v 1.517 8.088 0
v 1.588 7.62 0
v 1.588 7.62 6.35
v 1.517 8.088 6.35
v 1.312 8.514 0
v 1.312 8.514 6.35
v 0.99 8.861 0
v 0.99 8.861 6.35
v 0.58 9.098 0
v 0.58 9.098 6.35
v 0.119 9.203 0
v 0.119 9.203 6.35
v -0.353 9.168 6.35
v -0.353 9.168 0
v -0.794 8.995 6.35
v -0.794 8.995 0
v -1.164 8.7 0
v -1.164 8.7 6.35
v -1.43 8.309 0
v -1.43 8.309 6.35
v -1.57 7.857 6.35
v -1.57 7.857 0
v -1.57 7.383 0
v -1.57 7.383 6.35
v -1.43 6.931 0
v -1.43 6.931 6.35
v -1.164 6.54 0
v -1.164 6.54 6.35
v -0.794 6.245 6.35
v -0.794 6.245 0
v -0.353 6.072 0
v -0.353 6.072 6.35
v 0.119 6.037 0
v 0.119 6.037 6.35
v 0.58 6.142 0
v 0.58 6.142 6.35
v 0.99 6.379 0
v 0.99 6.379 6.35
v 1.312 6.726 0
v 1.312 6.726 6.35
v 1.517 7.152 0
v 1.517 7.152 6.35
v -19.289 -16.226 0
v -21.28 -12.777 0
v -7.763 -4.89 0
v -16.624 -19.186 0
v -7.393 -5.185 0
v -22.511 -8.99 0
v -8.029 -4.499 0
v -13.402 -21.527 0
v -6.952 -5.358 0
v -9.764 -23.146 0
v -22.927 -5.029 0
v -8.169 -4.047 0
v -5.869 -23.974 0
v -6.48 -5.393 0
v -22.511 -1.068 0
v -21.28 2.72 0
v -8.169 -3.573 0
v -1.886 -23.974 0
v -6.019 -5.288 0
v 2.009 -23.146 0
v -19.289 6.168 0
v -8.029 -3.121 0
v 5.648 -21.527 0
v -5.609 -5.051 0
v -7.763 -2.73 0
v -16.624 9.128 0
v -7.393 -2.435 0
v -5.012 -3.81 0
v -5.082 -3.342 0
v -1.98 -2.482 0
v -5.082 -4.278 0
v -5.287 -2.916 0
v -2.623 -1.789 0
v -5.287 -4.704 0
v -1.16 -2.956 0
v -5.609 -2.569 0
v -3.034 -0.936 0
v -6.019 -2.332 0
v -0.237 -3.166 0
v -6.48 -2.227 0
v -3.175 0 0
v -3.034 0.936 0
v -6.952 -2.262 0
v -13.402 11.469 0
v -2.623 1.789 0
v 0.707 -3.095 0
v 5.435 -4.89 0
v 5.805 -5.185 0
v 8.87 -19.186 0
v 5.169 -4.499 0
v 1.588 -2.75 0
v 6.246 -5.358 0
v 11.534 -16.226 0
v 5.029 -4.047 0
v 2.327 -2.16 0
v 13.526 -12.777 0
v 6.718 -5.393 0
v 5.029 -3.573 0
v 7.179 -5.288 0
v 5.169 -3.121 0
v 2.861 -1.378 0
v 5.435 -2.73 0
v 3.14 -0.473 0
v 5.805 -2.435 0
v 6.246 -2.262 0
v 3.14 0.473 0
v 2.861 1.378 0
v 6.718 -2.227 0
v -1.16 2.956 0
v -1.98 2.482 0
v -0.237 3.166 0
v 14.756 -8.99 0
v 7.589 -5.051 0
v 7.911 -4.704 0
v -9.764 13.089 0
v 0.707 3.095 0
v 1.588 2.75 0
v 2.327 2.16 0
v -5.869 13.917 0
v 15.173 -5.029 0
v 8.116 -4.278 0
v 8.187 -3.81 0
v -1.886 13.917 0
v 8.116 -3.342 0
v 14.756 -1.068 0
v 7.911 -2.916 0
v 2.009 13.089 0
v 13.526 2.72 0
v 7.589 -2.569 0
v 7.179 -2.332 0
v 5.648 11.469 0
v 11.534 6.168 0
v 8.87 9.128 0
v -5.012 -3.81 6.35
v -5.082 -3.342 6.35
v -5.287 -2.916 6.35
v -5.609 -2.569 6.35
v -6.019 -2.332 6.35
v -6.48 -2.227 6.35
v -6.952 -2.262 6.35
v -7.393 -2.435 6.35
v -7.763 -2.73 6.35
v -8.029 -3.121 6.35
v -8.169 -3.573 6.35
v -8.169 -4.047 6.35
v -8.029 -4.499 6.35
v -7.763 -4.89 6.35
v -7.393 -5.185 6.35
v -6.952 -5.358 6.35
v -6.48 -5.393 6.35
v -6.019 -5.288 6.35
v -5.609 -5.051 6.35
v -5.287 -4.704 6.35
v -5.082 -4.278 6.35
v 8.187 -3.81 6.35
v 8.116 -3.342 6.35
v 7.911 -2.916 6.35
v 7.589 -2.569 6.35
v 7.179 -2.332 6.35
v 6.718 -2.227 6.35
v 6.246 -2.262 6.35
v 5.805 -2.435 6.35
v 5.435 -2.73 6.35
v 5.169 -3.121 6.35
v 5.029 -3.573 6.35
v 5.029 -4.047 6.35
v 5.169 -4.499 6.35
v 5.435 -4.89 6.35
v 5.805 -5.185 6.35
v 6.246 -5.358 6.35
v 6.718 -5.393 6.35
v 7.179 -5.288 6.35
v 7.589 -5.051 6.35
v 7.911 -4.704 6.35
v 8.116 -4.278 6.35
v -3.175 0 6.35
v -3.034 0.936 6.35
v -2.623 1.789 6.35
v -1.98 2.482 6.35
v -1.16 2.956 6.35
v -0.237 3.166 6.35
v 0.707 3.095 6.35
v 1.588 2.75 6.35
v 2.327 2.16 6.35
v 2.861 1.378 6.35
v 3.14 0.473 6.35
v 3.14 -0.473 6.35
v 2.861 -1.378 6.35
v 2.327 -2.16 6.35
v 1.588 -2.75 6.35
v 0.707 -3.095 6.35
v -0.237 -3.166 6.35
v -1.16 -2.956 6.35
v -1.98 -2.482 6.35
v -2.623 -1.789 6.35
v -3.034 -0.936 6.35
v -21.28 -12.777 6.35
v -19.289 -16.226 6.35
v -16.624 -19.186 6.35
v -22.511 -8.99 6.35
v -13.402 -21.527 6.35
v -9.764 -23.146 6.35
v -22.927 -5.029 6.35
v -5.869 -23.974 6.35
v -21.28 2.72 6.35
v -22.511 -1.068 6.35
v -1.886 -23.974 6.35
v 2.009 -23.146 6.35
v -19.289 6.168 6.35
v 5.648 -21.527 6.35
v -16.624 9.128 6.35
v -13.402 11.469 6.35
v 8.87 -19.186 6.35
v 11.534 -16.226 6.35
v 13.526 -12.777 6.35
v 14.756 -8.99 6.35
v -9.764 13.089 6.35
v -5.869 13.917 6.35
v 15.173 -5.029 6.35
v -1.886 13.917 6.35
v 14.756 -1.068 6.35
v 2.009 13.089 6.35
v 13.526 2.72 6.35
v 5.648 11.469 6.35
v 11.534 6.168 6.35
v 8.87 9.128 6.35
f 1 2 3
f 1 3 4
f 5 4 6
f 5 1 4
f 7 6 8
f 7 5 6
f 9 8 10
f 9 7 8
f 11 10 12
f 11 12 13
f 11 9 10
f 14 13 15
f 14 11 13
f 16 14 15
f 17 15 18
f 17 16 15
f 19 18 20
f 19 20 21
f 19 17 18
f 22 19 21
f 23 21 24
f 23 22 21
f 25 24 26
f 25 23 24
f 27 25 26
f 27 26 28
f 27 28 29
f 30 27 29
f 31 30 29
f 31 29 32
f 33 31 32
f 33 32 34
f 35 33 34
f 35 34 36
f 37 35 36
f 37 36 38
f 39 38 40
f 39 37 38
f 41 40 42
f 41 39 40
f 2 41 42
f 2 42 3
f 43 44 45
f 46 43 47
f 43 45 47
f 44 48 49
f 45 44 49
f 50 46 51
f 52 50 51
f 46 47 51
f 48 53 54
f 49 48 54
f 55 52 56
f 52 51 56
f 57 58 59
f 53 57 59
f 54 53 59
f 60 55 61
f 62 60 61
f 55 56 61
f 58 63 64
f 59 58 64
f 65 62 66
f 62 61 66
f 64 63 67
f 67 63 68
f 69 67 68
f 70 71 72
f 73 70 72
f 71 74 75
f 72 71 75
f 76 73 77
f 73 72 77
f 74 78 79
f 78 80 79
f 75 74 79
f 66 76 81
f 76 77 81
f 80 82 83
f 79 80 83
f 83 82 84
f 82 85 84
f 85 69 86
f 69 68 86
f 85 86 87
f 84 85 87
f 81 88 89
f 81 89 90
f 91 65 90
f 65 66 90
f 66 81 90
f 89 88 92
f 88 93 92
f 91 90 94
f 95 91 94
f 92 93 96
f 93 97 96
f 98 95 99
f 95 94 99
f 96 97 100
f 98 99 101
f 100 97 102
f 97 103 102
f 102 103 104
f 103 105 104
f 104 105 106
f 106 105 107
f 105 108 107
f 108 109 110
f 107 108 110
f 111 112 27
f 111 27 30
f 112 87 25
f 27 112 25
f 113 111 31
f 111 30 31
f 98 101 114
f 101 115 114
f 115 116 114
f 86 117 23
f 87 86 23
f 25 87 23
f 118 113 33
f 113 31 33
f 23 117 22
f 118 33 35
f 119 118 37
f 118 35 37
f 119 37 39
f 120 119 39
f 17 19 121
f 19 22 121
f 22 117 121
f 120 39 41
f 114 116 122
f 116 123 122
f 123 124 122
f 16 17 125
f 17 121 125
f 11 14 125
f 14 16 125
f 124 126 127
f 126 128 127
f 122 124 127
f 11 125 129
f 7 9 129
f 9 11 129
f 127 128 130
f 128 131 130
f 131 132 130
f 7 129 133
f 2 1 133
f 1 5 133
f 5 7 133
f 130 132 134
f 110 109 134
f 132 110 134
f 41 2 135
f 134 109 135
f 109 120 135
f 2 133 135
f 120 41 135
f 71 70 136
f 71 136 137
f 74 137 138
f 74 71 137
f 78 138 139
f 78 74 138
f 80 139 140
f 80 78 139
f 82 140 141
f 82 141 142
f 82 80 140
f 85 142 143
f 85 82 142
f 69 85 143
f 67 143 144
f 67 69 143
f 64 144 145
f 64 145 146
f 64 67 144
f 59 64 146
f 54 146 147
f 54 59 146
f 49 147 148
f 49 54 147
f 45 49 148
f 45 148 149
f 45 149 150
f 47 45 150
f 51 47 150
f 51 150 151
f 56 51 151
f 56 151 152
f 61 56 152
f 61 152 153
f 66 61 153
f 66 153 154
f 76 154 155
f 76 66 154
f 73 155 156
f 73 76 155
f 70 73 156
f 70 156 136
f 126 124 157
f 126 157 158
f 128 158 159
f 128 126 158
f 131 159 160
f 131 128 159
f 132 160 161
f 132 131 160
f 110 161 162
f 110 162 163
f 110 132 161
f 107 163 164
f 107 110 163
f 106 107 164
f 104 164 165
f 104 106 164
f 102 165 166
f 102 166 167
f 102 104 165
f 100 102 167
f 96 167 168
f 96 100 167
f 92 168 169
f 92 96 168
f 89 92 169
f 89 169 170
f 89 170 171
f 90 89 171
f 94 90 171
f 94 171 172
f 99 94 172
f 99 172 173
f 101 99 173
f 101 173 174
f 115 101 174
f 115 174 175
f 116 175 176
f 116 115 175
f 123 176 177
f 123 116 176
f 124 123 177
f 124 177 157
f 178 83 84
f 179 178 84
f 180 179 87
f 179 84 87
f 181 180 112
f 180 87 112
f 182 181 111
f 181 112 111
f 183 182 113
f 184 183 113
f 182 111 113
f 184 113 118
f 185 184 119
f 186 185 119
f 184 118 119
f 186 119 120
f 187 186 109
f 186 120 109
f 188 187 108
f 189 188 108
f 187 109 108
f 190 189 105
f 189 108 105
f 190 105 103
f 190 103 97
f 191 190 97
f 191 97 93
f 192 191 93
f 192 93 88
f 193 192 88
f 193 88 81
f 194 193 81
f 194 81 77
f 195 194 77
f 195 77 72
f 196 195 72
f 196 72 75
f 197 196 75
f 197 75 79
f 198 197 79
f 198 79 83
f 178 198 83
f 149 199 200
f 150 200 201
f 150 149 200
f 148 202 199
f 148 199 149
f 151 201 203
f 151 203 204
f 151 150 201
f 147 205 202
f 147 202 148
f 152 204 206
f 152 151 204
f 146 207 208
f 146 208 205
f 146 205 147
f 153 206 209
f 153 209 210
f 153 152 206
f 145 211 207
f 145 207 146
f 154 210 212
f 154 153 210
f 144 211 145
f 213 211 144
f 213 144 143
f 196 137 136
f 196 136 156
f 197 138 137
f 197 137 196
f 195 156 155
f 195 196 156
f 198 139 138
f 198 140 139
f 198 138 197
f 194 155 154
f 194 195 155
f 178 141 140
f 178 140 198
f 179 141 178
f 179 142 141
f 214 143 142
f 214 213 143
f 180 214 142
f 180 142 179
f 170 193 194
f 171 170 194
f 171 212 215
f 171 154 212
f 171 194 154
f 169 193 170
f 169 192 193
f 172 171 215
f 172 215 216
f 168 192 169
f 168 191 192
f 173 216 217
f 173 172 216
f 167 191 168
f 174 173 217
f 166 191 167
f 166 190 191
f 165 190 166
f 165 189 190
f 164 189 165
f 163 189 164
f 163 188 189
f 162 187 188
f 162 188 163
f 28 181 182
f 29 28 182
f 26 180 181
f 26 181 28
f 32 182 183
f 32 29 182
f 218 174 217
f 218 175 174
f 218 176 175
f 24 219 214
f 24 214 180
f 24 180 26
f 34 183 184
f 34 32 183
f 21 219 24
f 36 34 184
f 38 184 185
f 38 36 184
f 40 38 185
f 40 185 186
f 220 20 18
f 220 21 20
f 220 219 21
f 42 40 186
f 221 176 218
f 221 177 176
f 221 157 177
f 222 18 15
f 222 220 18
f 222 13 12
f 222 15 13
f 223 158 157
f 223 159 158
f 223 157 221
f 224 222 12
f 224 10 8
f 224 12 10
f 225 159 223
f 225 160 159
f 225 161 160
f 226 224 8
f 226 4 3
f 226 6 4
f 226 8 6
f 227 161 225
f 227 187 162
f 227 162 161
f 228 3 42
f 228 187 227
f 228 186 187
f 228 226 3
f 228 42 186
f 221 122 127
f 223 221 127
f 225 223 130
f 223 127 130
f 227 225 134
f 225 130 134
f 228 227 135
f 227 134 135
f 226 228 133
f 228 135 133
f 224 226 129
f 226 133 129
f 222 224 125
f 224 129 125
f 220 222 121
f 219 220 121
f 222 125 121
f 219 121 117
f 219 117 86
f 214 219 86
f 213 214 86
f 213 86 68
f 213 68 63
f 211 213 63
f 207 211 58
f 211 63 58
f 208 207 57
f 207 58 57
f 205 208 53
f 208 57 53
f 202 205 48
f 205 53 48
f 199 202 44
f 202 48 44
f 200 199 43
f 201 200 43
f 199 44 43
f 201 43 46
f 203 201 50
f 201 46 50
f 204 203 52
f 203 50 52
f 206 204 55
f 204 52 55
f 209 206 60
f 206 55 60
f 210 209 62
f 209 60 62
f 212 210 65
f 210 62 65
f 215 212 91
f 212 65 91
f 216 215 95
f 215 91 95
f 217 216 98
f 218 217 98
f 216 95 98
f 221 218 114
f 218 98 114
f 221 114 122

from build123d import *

# Parameters (mm, degrees)
F0_R     = 19.05
F0_R_2   = 1.5875
F1_DEPTH = 6.35
F3_D     = 6.35


with BuildPart() as f1:
    # F0 (on Top) → F1 (new body)
    with BuildSketch(Plane.XY):
        with Locations((-3.877292, -5.028827)):
            Circle(F0_R)
        with Locations((-6.599113, -3.81)):
            Circle(F0_R_2, mode=Mode.SUBTRACT)
        with Locations((6.599114, -3.809999)):
            Circle(F0_R_2, mode=Mode.SUBTRACT)
        with Locations((0, 7.62)):
            Circle(F0_R_2, mode=Mode.SUBTRACT)
    extrude(amount=F1_DEPTH)

    # F3 (through all)
    with Locations(Plane.XY.offset(6.35)):
        with Locations((0, 0)):
            Hole(F3_D / 2)


solid = f1.part
